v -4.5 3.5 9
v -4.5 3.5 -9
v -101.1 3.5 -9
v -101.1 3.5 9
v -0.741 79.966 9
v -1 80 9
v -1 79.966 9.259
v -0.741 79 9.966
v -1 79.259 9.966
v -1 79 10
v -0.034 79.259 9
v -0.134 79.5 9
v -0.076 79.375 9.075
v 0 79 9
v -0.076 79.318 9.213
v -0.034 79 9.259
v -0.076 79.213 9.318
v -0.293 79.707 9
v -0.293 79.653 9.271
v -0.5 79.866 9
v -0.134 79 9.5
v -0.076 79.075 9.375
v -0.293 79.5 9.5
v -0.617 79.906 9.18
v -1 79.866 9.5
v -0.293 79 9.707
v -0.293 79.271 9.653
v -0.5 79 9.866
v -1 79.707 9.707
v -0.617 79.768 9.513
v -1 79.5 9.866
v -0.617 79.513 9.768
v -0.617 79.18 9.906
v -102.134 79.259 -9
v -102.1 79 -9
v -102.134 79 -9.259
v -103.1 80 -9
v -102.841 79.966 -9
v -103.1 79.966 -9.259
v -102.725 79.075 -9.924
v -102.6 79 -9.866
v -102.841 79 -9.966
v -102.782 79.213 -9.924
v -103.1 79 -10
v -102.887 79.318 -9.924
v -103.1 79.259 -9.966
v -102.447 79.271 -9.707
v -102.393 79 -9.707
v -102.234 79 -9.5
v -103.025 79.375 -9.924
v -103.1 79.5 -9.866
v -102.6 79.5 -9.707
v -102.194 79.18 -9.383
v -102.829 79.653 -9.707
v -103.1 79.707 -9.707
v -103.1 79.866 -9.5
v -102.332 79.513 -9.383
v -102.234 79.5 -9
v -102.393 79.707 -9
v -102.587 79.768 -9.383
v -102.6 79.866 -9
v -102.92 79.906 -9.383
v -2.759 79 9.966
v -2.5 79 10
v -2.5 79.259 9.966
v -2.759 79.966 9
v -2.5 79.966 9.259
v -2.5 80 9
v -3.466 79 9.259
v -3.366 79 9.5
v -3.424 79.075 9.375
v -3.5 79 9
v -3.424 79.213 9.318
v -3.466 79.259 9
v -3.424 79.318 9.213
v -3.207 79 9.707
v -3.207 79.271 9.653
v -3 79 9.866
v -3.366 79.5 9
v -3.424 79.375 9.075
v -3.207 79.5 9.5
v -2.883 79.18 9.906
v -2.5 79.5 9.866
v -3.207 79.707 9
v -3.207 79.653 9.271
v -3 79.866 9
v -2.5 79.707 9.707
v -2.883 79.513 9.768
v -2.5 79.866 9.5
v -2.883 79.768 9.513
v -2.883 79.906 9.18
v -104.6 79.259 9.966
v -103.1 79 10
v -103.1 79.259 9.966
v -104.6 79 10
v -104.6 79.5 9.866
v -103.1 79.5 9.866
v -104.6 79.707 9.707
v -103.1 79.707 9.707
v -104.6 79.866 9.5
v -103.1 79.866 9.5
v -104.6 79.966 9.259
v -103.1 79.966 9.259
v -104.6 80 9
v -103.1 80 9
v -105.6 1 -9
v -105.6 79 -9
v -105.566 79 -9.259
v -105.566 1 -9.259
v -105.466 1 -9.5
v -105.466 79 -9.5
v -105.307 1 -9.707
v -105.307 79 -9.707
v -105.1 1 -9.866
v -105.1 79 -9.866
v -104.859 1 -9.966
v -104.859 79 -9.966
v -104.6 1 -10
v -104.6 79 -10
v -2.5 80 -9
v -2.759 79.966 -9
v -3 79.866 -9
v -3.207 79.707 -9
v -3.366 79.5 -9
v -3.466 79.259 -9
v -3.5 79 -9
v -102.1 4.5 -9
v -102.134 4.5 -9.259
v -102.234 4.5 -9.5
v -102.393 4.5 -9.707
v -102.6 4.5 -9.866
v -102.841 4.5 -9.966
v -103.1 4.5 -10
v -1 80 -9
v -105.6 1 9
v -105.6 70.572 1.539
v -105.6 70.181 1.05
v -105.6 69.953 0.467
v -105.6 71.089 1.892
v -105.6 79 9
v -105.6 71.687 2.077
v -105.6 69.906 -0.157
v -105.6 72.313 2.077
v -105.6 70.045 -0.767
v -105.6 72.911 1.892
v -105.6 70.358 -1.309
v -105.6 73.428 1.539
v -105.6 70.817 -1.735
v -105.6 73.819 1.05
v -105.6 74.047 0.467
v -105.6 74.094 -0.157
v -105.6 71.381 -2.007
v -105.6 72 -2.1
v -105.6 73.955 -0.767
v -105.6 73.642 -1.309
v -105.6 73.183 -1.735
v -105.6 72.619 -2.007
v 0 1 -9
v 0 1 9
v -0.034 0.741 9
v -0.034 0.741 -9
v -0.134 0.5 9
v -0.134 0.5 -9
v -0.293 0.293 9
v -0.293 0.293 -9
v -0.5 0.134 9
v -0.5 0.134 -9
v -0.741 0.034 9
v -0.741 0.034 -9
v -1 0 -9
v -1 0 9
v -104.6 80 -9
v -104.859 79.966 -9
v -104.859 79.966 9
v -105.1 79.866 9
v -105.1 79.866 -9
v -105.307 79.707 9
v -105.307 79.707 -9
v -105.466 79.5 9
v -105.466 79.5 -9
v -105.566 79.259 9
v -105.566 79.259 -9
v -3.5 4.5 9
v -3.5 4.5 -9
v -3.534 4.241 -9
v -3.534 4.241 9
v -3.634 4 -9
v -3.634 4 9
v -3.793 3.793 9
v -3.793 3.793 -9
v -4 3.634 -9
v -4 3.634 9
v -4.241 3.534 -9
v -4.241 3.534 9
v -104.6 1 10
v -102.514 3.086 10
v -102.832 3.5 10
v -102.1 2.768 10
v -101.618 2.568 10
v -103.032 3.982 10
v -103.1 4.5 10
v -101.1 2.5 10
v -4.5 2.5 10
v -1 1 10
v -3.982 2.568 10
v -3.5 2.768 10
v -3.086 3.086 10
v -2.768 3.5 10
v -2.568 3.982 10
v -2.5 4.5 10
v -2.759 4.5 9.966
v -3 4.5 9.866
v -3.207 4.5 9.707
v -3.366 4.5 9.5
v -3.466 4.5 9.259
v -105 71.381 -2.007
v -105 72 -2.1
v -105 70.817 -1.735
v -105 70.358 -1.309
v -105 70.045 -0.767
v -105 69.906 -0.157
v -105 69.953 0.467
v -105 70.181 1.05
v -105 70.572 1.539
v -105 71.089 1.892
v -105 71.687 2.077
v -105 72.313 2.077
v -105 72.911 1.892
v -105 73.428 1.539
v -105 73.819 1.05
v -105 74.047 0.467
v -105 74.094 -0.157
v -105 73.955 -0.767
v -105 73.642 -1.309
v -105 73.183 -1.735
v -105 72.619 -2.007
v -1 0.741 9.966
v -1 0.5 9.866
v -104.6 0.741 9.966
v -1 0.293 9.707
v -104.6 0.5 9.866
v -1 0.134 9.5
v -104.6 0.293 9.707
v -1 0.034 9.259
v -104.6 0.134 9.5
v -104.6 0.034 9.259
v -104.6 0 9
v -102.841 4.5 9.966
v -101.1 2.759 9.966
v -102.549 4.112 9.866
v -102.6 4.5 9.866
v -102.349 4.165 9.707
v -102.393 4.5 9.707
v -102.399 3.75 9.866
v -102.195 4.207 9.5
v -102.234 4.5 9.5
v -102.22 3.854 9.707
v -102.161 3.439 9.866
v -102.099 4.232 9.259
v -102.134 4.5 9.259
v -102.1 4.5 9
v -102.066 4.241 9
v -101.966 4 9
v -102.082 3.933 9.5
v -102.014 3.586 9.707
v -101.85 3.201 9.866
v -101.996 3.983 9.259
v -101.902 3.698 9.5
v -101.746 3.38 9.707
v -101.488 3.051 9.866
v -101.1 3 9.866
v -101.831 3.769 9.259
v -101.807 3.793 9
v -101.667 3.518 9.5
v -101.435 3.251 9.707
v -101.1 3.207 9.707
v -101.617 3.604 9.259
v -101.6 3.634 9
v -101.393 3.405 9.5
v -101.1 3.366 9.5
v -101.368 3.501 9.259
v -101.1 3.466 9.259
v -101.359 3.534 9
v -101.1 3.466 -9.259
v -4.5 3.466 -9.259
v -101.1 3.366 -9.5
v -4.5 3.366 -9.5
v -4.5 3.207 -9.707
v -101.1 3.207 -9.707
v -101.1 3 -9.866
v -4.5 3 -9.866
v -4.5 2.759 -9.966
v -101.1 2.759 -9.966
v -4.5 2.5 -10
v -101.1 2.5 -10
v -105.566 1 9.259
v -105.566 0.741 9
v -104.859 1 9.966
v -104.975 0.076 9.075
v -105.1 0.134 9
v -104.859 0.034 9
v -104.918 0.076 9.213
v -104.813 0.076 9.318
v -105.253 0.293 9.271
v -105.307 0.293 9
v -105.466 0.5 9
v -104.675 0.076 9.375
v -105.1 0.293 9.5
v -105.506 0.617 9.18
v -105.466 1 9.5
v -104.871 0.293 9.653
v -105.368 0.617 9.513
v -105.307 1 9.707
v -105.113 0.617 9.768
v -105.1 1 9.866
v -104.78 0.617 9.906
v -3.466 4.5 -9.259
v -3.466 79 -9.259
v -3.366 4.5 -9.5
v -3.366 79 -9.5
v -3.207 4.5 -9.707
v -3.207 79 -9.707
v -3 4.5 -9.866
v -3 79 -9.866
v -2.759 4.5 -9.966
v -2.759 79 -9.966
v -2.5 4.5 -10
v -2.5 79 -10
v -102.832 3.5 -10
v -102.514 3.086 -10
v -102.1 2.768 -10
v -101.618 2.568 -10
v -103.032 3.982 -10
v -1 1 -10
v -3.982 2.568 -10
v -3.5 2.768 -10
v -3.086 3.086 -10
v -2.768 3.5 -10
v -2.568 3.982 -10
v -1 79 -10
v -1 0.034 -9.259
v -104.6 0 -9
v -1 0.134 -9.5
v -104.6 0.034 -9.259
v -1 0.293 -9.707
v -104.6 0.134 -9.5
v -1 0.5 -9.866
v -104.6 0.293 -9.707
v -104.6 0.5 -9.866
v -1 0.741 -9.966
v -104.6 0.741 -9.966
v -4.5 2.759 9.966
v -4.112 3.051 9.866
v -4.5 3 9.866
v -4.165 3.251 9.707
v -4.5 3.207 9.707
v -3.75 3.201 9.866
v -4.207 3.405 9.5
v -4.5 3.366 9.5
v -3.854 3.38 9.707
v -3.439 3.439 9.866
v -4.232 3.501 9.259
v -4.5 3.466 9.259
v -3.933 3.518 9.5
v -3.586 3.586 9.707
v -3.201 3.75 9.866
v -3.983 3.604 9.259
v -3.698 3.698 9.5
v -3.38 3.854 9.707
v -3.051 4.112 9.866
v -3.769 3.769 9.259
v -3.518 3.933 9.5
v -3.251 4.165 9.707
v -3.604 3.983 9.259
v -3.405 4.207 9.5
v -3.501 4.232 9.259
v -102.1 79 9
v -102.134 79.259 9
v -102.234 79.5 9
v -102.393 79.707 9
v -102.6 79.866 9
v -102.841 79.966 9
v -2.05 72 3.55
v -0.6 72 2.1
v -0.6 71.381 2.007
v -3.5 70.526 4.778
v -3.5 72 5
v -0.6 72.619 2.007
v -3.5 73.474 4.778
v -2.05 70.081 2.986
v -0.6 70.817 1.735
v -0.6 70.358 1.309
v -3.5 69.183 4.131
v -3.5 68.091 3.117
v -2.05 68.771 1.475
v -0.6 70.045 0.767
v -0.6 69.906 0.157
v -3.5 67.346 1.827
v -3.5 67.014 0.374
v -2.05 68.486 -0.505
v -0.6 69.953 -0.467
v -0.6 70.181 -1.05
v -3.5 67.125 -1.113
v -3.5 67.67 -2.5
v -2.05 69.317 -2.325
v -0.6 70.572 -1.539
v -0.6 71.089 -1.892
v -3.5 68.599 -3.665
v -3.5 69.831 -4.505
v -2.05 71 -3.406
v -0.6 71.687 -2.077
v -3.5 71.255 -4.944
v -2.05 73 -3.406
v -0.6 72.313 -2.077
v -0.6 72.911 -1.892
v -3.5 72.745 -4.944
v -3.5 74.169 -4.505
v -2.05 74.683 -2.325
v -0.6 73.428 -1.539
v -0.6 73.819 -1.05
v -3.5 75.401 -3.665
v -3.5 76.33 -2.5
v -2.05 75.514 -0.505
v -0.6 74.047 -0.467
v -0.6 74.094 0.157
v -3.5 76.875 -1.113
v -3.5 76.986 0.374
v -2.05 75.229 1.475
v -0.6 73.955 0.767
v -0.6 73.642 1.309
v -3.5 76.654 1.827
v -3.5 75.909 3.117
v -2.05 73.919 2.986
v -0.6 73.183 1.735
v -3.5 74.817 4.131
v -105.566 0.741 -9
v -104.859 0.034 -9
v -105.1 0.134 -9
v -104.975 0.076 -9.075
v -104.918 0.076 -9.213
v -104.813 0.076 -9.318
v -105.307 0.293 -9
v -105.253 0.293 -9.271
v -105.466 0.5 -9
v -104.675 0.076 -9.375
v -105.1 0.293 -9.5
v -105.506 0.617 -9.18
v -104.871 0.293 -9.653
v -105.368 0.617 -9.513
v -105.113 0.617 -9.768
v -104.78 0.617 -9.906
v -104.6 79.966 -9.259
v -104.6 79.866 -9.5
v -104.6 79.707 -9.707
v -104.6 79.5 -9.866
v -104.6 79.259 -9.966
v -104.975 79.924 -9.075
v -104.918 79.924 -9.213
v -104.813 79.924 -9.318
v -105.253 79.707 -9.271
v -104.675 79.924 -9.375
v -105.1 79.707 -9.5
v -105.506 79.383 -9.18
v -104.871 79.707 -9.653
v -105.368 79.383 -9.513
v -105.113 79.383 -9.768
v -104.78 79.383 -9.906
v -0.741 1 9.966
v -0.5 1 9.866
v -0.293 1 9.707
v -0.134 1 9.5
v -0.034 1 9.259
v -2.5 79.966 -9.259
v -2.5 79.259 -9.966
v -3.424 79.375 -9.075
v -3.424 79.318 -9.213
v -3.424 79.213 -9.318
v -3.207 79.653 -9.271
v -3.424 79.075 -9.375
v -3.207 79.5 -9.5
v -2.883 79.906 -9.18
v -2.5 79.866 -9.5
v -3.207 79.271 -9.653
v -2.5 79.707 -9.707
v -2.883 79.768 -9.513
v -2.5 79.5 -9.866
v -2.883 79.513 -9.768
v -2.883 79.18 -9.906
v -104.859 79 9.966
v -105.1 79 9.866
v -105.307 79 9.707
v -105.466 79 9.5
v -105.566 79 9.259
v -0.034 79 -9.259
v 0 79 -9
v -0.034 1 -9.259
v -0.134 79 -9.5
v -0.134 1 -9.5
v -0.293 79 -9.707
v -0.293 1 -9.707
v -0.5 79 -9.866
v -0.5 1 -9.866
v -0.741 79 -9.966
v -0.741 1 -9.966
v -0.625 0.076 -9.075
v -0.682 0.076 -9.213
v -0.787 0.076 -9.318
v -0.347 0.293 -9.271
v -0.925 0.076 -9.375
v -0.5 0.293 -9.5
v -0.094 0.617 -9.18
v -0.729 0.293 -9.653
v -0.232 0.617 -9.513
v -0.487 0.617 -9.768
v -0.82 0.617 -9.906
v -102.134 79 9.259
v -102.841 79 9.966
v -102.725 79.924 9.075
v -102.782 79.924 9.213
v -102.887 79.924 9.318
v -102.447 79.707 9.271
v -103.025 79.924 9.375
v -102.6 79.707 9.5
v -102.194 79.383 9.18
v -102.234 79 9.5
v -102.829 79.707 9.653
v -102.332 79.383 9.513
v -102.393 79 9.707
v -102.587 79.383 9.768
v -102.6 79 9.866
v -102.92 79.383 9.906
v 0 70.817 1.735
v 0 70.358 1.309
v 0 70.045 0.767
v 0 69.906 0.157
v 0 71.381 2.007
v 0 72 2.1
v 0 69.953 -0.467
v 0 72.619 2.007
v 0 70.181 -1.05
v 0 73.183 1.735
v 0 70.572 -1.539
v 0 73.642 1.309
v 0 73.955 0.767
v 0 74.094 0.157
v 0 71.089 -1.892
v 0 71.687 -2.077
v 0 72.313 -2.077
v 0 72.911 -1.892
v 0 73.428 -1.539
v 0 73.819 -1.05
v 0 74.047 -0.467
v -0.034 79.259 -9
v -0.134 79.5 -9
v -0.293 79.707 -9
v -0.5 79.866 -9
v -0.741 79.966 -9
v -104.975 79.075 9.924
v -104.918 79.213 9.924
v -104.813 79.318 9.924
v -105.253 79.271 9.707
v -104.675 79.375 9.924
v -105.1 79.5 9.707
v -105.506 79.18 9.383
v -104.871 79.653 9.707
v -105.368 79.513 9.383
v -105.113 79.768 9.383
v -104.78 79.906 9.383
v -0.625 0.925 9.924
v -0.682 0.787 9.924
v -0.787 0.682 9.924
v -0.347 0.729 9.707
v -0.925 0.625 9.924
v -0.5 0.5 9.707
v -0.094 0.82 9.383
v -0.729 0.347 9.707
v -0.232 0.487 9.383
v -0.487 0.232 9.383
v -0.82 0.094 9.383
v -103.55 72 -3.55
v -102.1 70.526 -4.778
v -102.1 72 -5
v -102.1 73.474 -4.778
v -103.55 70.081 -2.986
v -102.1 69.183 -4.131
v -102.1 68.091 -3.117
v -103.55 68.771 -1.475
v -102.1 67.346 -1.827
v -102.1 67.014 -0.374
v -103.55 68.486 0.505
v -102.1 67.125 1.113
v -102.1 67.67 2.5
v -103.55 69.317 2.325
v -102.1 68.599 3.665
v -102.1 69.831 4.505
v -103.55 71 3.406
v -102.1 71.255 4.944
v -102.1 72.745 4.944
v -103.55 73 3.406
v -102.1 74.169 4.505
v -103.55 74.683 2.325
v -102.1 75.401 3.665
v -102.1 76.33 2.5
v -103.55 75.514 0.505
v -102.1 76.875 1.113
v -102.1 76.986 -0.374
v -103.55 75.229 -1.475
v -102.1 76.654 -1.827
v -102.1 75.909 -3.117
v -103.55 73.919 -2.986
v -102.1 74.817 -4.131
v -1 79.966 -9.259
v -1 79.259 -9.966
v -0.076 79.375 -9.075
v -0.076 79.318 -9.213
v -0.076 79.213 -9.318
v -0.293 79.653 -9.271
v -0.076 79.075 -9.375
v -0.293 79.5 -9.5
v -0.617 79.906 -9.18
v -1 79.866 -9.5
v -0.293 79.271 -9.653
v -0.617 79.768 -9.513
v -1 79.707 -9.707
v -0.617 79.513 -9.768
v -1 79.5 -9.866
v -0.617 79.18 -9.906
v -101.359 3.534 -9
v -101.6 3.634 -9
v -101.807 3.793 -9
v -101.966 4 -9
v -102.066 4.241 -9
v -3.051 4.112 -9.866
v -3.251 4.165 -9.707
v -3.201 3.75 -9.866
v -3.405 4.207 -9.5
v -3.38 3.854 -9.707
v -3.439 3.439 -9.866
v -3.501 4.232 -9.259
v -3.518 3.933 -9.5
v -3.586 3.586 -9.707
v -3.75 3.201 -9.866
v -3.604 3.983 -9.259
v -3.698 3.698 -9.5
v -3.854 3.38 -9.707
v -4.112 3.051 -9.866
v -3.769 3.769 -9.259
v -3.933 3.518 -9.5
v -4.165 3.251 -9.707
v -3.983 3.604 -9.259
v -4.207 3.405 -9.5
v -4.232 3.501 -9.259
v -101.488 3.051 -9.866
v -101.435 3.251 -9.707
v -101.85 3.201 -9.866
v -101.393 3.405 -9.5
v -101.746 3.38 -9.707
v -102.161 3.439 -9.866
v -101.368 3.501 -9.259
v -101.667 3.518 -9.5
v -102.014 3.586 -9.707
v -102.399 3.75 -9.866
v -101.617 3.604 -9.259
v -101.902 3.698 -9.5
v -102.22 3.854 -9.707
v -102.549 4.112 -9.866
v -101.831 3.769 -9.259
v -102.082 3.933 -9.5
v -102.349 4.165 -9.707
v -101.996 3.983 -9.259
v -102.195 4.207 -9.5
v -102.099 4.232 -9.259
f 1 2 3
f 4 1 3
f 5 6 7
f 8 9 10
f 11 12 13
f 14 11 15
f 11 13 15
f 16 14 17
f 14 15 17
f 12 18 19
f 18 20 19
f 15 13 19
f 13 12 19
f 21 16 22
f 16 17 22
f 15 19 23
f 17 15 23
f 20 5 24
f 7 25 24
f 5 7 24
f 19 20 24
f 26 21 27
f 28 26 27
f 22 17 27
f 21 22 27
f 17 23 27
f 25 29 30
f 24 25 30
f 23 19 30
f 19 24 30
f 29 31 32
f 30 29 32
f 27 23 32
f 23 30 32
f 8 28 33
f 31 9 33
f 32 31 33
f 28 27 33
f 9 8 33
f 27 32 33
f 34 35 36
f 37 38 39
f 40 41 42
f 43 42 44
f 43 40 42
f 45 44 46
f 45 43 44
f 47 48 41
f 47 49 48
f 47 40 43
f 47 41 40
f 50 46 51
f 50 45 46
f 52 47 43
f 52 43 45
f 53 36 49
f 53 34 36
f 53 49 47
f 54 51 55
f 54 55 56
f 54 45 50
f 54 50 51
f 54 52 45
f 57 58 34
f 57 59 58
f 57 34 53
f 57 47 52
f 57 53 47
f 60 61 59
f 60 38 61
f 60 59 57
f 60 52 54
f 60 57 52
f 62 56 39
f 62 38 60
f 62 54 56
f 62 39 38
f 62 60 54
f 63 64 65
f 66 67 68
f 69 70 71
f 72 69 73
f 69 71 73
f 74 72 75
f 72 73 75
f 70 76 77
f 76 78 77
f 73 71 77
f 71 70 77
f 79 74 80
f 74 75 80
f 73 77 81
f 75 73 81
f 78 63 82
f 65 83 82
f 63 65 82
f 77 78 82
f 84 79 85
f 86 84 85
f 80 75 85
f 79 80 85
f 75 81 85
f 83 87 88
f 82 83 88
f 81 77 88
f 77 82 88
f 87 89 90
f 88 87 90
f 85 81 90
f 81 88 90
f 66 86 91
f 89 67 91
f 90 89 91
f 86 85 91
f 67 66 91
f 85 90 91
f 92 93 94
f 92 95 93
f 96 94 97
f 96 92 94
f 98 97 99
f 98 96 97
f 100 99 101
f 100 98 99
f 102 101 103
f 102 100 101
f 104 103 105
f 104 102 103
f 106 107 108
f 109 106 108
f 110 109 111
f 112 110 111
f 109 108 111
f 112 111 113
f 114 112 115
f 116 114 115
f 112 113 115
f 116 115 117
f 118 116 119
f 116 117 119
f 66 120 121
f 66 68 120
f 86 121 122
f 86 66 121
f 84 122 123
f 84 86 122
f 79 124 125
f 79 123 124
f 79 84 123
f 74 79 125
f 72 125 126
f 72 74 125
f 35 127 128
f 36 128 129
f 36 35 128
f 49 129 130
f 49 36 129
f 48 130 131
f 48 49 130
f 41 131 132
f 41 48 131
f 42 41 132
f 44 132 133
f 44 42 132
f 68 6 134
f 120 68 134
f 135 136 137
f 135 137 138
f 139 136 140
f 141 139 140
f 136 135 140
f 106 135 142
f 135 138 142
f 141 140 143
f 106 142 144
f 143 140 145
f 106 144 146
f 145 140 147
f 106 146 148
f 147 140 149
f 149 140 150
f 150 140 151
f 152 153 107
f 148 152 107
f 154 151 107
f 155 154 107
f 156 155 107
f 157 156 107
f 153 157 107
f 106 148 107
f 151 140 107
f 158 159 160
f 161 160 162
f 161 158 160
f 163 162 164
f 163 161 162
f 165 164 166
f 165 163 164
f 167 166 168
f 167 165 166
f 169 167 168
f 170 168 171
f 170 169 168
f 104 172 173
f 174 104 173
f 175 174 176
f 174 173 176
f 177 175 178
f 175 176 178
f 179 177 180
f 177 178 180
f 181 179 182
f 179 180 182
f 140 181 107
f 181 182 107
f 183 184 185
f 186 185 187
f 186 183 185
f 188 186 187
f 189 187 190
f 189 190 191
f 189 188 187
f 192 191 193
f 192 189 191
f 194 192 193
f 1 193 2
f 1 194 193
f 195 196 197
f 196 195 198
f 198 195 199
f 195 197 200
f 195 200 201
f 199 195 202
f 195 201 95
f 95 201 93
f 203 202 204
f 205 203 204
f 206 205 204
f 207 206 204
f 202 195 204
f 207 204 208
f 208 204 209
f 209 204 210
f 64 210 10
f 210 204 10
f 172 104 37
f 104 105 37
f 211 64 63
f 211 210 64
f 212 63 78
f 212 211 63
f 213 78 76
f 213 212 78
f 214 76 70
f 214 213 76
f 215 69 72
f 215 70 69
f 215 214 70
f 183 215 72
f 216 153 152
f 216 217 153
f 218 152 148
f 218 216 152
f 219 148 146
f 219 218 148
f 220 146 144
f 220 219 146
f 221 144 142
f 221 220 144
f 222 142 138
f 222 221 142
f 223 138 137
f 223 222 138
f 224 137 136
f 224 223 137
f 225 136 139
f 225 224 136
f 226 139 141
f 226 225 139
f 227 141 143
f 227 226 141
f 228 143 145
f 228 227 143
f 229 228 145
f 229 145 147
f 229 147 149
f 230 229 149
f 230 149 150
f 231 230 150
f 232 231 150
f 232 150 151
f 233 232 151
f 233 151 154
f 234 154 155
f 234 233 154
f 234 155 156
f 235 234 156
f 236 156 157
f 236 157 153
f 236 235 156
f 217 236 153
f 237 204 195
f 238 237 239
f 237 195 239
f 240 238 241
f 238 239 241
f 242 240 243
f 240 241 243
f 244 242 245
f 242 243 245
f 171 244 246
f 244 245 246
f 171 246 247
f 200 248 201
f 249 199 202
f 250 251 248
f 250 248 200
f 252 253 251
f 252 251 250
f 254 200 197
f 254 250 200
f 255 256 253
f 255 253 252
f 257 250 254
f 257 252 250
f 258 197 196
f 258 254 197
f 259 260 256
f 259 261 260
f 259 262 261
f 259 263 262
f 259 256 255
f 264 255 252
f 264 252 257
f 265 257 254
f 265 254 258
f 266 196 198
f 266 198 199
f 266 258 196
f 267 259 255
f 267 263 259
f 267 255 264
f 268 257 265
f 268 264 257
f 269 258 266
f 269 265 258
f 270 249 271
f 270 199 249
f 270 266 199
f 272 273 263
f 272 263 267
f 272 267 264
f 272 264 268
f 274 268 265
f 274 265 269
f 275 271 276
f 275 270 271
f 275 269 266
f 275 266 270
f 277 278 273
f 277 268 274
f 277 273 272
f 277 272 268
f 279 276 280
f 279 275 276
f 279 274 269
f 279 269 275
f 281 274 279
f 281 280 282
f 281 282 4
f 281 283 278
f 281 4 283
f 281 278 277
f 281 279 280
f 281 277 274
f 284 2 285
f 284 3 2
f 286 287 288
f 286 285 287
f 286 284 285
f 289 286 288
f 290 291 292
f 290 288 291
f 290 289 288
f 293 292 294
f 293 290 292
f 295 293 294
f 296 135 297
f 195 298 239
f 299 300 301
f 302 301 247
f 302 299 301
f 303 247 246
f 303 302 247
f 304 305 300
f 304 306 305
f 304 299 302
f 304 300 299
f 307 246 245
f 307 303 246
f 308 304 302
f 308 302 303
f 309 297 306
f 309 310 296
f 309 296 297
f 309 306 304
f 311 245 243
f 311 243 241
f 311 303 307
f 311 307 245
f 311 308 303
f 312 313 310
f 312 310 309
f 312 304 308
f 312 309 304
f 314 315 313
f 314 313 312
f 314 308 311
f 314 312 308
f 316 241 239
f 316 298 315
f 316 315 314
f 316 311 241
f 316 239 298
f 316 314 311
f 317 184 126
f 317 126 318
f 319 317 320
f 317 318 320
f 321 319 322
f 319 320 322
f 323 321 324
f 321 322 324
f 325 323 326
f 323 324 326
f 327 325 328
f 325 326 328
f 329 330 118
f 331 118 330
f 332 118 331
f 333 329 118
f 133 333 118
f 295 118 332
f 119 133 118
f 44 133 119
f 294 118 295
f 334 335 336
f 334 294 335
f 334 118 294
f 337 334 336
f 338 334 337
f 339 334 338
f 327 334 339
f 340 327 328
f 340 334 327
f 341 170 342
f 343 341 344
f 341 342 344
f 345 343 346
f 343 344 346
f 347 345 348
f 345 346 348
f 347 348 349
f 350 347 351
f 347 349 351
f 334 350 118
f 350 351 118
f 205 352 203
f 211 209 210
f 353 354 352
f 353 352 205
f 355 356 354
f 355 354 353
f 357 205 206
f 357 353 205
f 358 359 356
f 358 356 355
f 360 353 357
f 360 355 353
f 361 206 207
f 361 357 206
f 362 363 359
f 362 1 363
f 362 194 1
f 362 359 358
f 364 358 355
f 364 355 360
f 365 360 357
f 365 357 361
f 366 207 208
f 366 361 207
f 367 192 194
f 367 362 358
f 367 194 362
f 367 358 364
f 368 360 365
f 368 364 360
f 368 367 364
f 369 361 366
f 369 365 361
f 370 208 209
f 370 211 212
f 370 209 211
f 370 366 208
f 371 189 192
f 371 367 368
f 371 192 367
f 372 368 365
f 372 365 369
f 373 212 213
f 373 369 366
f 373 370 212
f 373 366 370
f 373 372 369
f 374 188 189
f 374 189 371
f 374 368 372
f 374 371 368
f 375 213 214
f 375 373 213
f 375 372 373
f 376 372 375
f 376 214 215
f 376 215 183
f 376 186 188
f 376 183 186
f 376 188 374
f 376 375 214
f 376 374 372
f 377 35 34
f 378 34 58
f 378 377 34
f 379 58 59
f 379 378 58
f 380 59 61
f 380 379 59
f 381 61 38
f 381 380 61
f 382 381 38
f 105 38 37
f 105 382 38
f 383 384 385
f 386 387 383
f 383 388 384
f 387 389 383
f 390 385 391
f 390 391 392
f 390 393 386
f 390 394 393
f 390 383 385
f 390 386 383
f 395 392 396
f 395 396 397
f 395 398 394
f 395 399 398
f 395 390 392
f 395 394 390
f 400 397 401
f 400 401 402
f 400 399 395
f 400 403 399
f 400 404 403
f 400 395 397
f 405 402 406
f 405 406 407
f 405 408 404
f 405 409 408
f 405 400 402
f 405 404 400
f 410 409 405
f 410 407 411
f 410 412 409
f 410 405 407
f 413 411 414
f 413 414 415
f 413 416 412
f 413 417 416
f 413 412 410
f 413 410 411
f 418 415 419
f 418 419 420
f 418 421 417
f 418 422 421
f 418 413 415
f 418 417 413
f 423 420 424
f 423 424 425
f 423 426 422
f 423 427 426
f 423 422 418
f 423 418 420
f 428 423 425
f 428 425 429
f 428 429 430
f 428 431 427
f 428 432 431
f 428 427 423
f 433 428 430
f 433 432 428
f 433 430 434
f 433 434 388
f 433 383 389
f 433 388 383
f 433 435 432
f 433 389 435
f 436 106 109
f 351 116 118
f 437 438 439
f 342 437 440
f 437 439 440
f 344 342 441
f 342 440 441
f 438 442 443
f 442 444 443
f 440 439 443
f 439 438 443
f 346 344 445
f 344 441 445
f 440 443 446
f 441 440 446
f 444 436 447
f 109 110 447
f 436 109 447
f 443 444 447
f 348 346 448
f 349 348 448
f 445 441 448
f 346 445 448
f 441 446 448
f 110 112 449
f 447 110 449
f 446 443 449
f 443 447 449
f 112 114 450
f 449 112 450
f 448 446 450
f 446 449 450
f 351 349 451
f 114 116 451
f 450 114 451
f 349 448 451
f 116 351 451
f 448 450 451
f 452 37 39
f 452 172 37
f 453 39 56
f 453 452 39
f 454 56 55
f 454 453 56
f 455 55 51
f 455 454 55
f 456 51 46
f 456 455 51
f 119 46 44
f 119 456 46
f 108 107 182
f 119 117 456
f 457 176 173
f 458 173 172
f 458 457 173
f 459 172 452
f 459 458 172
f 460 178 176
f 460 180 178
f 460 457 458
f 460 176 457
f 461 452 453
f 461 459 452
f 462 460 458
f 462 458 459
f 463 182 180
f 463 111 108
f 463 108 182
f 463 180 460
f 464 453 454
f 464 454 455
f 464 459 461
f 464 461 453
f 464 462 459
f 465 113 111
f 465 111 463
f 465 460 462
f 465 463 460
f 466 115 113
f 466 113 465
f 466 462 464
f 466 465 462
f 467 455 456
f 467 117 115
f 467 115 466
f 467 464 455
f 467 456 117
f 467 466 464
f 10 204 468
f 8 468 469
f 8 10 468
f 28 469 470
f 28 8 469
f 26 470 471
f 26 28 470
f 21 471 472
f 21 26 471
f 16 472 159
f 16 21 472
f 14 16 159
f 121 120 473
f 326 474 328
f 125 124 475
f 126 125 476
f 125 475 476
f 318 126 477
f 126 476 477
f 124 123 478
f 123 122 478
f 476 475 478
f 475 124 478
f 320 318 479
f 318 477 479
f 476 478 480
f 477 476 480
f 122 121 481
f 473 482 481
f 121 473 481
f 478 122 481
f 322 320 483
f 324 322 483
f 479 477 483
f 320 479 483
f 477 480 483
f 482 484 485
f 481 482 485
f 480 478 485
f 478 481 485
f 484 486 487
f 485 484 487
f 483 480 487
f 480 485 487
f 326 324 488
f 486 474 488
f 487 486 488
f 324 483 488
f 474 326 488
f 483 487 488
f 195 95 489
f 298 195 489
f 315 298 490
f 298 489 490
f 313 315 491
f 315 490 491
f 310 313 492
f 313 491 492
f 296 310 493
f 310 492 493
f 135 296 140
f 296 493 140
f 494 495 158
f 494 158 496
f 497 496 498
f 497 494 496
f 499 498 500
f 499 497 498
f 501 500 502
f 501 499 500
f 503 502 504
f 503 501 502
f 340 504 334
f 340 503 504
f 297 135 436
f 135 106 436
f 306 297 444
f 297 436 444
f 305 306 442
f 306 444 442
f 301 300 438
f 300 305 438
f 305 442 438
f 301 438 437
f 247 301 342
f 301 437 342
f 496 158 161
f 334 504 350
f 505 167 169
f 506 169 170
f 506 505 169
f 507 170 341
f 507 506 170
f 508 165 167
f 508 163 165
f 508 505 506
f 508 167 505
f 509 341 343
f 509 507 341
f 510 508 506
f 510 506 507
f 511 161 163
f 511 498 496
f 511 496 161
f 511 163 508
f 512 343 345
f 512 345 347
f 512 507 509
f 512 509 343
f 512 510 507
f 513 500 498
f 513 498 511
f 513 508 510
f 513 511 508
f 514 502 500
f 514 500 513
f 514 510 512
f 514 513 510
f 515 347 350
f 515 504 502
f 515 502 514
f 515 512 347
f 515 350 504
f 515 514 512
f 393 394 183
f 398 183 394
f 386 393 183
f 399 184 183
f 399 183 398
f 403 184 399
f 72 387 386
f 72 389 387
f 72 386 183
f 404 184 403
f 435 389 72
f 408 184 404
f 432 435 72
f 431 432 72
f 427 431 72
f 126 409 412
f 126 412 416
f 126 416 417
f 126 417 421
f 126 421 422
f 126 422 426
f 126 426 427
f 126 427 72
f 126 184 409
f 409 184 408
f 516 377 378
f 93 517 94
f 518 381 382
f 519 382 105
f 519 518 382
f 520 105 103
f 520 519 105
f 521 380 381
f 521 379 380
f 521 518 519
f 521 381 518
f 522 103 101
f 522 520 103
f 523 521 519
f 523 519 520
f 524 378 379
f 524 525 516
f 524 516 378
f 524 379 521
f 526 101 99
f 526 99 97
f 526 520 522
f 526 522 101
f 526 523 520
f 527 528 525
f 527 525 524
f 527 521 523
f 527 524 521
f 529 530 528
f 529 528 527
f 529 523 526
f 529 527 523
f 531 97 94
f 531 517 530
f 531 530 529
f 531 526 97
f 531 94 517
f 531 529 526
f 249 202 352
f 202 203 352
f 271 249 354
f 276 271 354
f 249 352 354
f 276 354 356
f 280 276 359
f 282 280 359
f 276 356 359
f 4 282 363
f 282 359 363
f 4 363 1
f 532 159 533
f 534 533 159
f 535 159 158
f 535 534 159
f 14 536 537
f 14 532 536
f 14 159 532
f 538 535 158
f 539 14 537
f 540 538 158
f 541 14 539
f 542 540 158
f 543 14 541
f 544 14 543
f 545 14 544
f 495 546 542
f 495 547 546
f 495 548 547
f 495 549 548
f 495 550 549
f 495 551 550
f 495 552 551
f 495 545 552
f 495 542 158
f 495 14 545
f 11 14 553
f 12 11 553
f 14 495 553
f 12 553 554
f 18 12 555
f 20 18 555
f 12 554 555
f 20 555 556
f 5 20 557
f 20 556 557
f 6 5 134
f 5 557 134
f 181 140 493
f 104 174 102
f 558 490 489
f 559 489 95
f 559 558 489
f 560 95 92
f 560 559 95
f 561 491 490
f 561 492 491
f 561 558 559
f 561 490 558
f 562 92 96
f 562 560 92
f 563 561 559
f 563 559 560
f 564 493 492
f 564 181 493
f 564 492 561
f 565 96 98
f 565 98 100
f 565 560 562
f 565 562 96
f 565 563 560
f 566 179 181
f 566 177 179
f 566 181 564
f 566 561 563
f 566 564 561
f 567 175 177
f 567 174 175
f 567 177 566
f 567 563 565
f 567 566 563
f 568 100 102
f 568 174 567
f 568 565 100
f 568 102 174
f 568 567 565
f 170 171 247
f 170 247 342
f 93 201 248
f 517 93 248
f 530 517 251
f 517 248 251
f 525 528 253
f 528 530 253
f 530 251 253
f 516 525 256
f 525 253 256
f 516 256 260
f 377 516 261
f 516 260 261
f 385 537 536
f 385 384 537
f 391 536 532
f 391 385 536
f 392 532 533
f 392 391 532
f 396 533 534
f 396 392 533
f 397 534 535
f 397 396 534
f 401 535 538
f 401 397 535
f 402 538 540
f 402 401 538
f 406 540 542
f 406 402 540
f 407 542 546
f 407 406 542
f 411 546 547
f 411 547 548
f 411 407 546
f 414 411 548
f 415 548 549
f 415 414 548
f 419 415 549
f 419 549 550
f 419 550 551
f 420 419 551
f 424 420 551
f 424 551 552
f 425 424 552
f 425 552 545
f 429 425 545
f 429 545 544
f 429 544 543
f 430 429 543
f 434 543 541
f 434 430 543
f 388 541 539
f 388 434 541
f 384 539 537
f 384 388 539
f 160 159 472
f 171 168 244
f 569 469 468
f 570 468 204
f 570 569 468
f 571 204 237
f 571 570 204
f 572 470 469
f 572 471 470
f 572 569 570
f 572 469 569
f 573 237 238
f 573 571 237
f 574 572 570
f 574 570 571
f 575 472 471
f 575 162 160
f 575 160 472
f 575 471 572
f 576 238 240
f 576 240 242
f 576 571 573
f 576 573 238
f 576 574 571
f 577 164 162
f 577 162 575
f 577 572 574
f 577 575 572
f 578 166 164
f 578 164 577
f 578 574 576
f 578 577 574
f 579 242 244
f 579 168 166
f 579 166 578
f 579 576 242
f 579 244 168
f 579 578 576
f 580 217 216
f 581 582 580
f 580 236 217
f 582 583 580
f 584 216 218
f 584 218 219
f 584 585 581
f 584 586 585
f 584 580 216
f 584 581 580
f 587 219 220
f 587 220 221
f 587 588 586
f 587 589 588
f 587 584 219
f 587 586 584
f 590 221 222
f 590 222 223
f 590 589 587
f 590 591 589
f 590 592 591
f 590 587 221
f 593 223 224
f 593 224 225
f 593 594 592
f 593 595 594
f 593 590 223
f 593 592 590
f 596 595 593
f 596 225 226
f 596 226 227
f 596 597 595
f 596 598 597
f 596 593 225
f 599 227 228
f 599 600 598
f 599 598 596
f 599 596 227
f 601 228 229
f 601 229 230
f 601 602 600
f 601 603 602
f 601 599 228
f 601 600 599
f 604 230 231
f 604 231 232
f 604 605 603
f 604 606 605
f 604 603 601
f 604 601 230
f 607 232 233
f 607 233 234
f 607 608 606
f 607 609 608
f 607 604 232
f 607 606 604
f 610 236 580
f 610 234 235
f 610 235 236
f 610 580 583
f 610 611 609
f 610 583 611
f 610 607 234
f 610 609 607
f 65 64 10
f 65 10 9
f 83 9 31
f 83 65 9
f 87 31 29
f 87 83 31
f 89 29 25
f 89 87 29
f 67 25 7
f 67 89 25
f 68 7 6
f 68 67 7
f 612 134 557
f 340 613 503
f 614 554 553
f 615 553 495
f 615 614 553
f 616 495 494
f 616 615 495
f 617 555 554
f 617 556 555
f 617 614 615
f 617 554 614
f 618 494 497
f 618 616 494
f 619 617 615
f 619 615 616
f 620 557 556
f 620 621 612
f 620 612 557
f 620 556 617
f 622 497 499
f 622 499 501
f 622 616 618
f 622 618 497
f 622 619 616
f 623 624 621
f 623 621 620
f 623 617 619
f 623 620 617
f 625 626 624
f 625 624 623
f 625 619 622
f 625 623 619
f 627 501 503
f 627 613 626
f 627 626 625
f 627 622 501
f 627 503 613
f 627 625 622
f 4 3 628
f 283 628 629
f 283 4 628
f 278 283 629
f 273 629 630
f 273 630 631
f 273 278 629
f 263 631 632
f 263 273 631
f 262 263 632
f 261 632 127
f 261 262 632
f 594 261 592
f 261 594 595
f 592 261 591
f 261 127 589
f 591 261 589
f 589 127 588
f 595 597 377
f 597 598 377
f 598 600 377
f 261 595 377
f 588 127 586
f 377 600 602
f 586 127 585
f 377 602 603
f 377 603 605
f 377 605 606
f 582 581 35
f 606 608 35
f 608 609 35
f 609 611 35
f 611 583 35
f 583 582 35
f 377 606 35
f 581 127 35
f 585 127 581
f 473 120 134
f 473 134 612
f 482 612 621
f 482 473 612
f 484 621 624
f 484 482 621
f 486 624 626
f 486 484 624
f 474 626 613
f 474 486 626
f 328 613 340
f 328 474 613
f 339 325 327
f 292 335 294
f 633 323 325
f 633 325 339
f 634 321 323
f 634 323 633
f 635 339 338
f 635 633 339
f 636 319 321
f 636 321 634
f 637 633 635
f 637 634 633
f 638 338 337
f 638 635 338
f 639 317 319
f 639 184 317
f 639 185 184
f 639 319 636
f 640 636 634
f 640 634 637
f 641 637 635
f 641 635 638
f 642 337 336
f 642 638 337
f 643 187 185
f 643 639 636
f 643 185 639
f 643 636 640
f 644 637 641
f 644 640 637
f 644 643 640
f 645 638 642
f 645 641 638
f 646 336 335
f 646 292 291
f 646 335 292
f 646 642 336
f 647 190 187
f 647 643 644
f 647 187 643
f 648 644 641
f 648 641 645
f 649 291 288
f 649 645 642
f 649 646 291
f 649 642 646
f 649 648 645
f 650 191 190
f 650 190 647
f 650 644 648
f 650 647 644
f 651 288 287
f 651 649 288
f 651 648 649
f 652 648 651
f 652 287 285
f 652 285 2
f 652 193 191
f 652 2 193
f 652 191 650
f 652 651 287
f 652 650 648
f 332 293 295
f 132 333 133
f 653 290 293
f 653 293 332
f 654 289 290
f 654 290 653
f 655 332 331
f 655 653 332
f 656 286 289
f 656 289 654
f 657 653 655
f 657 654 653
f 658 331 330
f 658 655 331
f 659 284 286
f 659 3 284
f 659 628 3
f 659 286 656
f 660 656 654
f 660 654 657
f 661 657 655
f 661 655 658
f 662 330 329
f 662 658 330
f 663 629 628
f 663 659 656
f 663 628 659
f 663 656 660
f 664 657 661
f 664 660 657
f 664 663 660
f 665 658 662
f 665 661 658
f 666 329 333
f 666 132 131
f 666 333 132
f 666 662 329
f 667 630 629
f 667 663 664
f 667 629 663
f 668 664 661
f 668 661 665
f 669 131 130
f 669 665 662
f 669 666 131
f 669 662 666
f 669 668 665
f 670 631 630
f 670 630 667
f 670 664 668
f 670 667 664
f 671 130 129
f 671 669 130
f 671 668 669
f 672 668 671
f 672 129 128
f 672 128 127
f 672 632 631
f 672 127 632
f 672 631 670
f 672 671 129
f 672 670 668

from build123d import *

# Parameters (mm, degrees)
SKETCH1_W           = 20
SKETCH1_H           = 80
BOSS_EXTRUDE1_DEPTH = 105.6
CUT_EXTRUDE1_REACH  = 135.983
SKETCH2_W           = 98.6
SKETCH2_H           = 76.5
FILLET1_R           = 1


with BuildPart() as part:
    # Sketch1 → Boss-Extrude1 (new body)
    with BuildSketch(Plane(origin=(0, 0, 0), x_dir=(0, 0, -1), z_dir=(1, 0, 0))):
        with Locations((0, 40)):
            Rectangle(SKETCH1_W, SKETCH1_H)
    extrude(amount=-BOSS_EXTRUDE1_DEPTH)

    # Sketch2 → Cut-Extrude1 (cut, up to next)
    with BuildSketch(Plane(origin=(0, 0, -10), x_dir=(-1, 0, 0), z_dir=(0, 0, -1)), mode=Mode.PRIVATE) as cut_extrude1_sk1:
        with Locations((52.8, 41.75)):
            Rectangle(SKETCH2_W, SKETCH2_H)
    cut_extrude1_tool1 = extrude(cut_extrude1_sk1.sketch, amount=-CUT_EXTRUDE1_REACH, mode=Mode.PRIVATE) & part.part
    add(cut_extrude1_tool1.solids().sort_by_distance((-52.8, 41.75, -10))[0], mode=Mode.SUBTRACT)

    # Sketch4 → M5 Tapped Hole2 (revolve, cut)
    with BuildSketch(Plane(origin=(-102.1, 72, 0), x_dir=(0, 0, -1), z_dir=(0, 1, 0))):
        Polygon((0, 0), (0, 3.5), (2.1, 3.5), (2.1, 2.9), (5, 0), align=None)
    revolve(axis=Axis((-95.75, 72, 0), (-1, 0, 0)), mode=Mode.SUBTRACT)

    # Sketch15 → M5 Tapped Hole1 (revolve, cut)
    with BuildSketch(Plane(origin=(-3.5, 72, 0), x_dir=(0, 0, 1), z_dir=(0, 1, 0))):
        Polygon((0, 0), (0, 3.5), (2.1, 3.5), (2.1, 2.9), (5, 0), align=None)
    revolve(axis=Axis((-9.85, 72, 0), (1, 0, 0)), mode=Mode.SUBTRACT)

    # Fillet1
    fillet1_edges = [part.edges().sort_by_distance(p)[0] for p in [
        (-105.6, 40, -10),
        (-105.6, 80, 0),
        (-1.75, 80, -10),
        (-1.75, 80, 10),
        (-3.5, 41.75, 10),
        (-3.5, 3.5, 0),
        (-3.5, 80, 0),
        (-102.1, 41.75, 10),
        (-102.1, 80, 0),
        (-52.8, 3.5, 10),
        (-102.1, 3.5, 0),
        (-3.5, 41.75, -10),
        (-52.8, 3.5, -10),
        (-102.1, 41.75, -10),
        (-105.6, 40, 10),
        (0, 80, 0),
        (0, 40, -10),
        (0, 0, 0),
        (0, 40, 10),
        (-105.6, 0, 0),
        (-103.85, 80, 10),
        (-103.85, 80, -10),
        (-52.8, 0, -10),
        (-52.8, 0, 10),
    ]]
    fillet(fillet1_edges, radius=FILLET1_R)


solid = part.part
